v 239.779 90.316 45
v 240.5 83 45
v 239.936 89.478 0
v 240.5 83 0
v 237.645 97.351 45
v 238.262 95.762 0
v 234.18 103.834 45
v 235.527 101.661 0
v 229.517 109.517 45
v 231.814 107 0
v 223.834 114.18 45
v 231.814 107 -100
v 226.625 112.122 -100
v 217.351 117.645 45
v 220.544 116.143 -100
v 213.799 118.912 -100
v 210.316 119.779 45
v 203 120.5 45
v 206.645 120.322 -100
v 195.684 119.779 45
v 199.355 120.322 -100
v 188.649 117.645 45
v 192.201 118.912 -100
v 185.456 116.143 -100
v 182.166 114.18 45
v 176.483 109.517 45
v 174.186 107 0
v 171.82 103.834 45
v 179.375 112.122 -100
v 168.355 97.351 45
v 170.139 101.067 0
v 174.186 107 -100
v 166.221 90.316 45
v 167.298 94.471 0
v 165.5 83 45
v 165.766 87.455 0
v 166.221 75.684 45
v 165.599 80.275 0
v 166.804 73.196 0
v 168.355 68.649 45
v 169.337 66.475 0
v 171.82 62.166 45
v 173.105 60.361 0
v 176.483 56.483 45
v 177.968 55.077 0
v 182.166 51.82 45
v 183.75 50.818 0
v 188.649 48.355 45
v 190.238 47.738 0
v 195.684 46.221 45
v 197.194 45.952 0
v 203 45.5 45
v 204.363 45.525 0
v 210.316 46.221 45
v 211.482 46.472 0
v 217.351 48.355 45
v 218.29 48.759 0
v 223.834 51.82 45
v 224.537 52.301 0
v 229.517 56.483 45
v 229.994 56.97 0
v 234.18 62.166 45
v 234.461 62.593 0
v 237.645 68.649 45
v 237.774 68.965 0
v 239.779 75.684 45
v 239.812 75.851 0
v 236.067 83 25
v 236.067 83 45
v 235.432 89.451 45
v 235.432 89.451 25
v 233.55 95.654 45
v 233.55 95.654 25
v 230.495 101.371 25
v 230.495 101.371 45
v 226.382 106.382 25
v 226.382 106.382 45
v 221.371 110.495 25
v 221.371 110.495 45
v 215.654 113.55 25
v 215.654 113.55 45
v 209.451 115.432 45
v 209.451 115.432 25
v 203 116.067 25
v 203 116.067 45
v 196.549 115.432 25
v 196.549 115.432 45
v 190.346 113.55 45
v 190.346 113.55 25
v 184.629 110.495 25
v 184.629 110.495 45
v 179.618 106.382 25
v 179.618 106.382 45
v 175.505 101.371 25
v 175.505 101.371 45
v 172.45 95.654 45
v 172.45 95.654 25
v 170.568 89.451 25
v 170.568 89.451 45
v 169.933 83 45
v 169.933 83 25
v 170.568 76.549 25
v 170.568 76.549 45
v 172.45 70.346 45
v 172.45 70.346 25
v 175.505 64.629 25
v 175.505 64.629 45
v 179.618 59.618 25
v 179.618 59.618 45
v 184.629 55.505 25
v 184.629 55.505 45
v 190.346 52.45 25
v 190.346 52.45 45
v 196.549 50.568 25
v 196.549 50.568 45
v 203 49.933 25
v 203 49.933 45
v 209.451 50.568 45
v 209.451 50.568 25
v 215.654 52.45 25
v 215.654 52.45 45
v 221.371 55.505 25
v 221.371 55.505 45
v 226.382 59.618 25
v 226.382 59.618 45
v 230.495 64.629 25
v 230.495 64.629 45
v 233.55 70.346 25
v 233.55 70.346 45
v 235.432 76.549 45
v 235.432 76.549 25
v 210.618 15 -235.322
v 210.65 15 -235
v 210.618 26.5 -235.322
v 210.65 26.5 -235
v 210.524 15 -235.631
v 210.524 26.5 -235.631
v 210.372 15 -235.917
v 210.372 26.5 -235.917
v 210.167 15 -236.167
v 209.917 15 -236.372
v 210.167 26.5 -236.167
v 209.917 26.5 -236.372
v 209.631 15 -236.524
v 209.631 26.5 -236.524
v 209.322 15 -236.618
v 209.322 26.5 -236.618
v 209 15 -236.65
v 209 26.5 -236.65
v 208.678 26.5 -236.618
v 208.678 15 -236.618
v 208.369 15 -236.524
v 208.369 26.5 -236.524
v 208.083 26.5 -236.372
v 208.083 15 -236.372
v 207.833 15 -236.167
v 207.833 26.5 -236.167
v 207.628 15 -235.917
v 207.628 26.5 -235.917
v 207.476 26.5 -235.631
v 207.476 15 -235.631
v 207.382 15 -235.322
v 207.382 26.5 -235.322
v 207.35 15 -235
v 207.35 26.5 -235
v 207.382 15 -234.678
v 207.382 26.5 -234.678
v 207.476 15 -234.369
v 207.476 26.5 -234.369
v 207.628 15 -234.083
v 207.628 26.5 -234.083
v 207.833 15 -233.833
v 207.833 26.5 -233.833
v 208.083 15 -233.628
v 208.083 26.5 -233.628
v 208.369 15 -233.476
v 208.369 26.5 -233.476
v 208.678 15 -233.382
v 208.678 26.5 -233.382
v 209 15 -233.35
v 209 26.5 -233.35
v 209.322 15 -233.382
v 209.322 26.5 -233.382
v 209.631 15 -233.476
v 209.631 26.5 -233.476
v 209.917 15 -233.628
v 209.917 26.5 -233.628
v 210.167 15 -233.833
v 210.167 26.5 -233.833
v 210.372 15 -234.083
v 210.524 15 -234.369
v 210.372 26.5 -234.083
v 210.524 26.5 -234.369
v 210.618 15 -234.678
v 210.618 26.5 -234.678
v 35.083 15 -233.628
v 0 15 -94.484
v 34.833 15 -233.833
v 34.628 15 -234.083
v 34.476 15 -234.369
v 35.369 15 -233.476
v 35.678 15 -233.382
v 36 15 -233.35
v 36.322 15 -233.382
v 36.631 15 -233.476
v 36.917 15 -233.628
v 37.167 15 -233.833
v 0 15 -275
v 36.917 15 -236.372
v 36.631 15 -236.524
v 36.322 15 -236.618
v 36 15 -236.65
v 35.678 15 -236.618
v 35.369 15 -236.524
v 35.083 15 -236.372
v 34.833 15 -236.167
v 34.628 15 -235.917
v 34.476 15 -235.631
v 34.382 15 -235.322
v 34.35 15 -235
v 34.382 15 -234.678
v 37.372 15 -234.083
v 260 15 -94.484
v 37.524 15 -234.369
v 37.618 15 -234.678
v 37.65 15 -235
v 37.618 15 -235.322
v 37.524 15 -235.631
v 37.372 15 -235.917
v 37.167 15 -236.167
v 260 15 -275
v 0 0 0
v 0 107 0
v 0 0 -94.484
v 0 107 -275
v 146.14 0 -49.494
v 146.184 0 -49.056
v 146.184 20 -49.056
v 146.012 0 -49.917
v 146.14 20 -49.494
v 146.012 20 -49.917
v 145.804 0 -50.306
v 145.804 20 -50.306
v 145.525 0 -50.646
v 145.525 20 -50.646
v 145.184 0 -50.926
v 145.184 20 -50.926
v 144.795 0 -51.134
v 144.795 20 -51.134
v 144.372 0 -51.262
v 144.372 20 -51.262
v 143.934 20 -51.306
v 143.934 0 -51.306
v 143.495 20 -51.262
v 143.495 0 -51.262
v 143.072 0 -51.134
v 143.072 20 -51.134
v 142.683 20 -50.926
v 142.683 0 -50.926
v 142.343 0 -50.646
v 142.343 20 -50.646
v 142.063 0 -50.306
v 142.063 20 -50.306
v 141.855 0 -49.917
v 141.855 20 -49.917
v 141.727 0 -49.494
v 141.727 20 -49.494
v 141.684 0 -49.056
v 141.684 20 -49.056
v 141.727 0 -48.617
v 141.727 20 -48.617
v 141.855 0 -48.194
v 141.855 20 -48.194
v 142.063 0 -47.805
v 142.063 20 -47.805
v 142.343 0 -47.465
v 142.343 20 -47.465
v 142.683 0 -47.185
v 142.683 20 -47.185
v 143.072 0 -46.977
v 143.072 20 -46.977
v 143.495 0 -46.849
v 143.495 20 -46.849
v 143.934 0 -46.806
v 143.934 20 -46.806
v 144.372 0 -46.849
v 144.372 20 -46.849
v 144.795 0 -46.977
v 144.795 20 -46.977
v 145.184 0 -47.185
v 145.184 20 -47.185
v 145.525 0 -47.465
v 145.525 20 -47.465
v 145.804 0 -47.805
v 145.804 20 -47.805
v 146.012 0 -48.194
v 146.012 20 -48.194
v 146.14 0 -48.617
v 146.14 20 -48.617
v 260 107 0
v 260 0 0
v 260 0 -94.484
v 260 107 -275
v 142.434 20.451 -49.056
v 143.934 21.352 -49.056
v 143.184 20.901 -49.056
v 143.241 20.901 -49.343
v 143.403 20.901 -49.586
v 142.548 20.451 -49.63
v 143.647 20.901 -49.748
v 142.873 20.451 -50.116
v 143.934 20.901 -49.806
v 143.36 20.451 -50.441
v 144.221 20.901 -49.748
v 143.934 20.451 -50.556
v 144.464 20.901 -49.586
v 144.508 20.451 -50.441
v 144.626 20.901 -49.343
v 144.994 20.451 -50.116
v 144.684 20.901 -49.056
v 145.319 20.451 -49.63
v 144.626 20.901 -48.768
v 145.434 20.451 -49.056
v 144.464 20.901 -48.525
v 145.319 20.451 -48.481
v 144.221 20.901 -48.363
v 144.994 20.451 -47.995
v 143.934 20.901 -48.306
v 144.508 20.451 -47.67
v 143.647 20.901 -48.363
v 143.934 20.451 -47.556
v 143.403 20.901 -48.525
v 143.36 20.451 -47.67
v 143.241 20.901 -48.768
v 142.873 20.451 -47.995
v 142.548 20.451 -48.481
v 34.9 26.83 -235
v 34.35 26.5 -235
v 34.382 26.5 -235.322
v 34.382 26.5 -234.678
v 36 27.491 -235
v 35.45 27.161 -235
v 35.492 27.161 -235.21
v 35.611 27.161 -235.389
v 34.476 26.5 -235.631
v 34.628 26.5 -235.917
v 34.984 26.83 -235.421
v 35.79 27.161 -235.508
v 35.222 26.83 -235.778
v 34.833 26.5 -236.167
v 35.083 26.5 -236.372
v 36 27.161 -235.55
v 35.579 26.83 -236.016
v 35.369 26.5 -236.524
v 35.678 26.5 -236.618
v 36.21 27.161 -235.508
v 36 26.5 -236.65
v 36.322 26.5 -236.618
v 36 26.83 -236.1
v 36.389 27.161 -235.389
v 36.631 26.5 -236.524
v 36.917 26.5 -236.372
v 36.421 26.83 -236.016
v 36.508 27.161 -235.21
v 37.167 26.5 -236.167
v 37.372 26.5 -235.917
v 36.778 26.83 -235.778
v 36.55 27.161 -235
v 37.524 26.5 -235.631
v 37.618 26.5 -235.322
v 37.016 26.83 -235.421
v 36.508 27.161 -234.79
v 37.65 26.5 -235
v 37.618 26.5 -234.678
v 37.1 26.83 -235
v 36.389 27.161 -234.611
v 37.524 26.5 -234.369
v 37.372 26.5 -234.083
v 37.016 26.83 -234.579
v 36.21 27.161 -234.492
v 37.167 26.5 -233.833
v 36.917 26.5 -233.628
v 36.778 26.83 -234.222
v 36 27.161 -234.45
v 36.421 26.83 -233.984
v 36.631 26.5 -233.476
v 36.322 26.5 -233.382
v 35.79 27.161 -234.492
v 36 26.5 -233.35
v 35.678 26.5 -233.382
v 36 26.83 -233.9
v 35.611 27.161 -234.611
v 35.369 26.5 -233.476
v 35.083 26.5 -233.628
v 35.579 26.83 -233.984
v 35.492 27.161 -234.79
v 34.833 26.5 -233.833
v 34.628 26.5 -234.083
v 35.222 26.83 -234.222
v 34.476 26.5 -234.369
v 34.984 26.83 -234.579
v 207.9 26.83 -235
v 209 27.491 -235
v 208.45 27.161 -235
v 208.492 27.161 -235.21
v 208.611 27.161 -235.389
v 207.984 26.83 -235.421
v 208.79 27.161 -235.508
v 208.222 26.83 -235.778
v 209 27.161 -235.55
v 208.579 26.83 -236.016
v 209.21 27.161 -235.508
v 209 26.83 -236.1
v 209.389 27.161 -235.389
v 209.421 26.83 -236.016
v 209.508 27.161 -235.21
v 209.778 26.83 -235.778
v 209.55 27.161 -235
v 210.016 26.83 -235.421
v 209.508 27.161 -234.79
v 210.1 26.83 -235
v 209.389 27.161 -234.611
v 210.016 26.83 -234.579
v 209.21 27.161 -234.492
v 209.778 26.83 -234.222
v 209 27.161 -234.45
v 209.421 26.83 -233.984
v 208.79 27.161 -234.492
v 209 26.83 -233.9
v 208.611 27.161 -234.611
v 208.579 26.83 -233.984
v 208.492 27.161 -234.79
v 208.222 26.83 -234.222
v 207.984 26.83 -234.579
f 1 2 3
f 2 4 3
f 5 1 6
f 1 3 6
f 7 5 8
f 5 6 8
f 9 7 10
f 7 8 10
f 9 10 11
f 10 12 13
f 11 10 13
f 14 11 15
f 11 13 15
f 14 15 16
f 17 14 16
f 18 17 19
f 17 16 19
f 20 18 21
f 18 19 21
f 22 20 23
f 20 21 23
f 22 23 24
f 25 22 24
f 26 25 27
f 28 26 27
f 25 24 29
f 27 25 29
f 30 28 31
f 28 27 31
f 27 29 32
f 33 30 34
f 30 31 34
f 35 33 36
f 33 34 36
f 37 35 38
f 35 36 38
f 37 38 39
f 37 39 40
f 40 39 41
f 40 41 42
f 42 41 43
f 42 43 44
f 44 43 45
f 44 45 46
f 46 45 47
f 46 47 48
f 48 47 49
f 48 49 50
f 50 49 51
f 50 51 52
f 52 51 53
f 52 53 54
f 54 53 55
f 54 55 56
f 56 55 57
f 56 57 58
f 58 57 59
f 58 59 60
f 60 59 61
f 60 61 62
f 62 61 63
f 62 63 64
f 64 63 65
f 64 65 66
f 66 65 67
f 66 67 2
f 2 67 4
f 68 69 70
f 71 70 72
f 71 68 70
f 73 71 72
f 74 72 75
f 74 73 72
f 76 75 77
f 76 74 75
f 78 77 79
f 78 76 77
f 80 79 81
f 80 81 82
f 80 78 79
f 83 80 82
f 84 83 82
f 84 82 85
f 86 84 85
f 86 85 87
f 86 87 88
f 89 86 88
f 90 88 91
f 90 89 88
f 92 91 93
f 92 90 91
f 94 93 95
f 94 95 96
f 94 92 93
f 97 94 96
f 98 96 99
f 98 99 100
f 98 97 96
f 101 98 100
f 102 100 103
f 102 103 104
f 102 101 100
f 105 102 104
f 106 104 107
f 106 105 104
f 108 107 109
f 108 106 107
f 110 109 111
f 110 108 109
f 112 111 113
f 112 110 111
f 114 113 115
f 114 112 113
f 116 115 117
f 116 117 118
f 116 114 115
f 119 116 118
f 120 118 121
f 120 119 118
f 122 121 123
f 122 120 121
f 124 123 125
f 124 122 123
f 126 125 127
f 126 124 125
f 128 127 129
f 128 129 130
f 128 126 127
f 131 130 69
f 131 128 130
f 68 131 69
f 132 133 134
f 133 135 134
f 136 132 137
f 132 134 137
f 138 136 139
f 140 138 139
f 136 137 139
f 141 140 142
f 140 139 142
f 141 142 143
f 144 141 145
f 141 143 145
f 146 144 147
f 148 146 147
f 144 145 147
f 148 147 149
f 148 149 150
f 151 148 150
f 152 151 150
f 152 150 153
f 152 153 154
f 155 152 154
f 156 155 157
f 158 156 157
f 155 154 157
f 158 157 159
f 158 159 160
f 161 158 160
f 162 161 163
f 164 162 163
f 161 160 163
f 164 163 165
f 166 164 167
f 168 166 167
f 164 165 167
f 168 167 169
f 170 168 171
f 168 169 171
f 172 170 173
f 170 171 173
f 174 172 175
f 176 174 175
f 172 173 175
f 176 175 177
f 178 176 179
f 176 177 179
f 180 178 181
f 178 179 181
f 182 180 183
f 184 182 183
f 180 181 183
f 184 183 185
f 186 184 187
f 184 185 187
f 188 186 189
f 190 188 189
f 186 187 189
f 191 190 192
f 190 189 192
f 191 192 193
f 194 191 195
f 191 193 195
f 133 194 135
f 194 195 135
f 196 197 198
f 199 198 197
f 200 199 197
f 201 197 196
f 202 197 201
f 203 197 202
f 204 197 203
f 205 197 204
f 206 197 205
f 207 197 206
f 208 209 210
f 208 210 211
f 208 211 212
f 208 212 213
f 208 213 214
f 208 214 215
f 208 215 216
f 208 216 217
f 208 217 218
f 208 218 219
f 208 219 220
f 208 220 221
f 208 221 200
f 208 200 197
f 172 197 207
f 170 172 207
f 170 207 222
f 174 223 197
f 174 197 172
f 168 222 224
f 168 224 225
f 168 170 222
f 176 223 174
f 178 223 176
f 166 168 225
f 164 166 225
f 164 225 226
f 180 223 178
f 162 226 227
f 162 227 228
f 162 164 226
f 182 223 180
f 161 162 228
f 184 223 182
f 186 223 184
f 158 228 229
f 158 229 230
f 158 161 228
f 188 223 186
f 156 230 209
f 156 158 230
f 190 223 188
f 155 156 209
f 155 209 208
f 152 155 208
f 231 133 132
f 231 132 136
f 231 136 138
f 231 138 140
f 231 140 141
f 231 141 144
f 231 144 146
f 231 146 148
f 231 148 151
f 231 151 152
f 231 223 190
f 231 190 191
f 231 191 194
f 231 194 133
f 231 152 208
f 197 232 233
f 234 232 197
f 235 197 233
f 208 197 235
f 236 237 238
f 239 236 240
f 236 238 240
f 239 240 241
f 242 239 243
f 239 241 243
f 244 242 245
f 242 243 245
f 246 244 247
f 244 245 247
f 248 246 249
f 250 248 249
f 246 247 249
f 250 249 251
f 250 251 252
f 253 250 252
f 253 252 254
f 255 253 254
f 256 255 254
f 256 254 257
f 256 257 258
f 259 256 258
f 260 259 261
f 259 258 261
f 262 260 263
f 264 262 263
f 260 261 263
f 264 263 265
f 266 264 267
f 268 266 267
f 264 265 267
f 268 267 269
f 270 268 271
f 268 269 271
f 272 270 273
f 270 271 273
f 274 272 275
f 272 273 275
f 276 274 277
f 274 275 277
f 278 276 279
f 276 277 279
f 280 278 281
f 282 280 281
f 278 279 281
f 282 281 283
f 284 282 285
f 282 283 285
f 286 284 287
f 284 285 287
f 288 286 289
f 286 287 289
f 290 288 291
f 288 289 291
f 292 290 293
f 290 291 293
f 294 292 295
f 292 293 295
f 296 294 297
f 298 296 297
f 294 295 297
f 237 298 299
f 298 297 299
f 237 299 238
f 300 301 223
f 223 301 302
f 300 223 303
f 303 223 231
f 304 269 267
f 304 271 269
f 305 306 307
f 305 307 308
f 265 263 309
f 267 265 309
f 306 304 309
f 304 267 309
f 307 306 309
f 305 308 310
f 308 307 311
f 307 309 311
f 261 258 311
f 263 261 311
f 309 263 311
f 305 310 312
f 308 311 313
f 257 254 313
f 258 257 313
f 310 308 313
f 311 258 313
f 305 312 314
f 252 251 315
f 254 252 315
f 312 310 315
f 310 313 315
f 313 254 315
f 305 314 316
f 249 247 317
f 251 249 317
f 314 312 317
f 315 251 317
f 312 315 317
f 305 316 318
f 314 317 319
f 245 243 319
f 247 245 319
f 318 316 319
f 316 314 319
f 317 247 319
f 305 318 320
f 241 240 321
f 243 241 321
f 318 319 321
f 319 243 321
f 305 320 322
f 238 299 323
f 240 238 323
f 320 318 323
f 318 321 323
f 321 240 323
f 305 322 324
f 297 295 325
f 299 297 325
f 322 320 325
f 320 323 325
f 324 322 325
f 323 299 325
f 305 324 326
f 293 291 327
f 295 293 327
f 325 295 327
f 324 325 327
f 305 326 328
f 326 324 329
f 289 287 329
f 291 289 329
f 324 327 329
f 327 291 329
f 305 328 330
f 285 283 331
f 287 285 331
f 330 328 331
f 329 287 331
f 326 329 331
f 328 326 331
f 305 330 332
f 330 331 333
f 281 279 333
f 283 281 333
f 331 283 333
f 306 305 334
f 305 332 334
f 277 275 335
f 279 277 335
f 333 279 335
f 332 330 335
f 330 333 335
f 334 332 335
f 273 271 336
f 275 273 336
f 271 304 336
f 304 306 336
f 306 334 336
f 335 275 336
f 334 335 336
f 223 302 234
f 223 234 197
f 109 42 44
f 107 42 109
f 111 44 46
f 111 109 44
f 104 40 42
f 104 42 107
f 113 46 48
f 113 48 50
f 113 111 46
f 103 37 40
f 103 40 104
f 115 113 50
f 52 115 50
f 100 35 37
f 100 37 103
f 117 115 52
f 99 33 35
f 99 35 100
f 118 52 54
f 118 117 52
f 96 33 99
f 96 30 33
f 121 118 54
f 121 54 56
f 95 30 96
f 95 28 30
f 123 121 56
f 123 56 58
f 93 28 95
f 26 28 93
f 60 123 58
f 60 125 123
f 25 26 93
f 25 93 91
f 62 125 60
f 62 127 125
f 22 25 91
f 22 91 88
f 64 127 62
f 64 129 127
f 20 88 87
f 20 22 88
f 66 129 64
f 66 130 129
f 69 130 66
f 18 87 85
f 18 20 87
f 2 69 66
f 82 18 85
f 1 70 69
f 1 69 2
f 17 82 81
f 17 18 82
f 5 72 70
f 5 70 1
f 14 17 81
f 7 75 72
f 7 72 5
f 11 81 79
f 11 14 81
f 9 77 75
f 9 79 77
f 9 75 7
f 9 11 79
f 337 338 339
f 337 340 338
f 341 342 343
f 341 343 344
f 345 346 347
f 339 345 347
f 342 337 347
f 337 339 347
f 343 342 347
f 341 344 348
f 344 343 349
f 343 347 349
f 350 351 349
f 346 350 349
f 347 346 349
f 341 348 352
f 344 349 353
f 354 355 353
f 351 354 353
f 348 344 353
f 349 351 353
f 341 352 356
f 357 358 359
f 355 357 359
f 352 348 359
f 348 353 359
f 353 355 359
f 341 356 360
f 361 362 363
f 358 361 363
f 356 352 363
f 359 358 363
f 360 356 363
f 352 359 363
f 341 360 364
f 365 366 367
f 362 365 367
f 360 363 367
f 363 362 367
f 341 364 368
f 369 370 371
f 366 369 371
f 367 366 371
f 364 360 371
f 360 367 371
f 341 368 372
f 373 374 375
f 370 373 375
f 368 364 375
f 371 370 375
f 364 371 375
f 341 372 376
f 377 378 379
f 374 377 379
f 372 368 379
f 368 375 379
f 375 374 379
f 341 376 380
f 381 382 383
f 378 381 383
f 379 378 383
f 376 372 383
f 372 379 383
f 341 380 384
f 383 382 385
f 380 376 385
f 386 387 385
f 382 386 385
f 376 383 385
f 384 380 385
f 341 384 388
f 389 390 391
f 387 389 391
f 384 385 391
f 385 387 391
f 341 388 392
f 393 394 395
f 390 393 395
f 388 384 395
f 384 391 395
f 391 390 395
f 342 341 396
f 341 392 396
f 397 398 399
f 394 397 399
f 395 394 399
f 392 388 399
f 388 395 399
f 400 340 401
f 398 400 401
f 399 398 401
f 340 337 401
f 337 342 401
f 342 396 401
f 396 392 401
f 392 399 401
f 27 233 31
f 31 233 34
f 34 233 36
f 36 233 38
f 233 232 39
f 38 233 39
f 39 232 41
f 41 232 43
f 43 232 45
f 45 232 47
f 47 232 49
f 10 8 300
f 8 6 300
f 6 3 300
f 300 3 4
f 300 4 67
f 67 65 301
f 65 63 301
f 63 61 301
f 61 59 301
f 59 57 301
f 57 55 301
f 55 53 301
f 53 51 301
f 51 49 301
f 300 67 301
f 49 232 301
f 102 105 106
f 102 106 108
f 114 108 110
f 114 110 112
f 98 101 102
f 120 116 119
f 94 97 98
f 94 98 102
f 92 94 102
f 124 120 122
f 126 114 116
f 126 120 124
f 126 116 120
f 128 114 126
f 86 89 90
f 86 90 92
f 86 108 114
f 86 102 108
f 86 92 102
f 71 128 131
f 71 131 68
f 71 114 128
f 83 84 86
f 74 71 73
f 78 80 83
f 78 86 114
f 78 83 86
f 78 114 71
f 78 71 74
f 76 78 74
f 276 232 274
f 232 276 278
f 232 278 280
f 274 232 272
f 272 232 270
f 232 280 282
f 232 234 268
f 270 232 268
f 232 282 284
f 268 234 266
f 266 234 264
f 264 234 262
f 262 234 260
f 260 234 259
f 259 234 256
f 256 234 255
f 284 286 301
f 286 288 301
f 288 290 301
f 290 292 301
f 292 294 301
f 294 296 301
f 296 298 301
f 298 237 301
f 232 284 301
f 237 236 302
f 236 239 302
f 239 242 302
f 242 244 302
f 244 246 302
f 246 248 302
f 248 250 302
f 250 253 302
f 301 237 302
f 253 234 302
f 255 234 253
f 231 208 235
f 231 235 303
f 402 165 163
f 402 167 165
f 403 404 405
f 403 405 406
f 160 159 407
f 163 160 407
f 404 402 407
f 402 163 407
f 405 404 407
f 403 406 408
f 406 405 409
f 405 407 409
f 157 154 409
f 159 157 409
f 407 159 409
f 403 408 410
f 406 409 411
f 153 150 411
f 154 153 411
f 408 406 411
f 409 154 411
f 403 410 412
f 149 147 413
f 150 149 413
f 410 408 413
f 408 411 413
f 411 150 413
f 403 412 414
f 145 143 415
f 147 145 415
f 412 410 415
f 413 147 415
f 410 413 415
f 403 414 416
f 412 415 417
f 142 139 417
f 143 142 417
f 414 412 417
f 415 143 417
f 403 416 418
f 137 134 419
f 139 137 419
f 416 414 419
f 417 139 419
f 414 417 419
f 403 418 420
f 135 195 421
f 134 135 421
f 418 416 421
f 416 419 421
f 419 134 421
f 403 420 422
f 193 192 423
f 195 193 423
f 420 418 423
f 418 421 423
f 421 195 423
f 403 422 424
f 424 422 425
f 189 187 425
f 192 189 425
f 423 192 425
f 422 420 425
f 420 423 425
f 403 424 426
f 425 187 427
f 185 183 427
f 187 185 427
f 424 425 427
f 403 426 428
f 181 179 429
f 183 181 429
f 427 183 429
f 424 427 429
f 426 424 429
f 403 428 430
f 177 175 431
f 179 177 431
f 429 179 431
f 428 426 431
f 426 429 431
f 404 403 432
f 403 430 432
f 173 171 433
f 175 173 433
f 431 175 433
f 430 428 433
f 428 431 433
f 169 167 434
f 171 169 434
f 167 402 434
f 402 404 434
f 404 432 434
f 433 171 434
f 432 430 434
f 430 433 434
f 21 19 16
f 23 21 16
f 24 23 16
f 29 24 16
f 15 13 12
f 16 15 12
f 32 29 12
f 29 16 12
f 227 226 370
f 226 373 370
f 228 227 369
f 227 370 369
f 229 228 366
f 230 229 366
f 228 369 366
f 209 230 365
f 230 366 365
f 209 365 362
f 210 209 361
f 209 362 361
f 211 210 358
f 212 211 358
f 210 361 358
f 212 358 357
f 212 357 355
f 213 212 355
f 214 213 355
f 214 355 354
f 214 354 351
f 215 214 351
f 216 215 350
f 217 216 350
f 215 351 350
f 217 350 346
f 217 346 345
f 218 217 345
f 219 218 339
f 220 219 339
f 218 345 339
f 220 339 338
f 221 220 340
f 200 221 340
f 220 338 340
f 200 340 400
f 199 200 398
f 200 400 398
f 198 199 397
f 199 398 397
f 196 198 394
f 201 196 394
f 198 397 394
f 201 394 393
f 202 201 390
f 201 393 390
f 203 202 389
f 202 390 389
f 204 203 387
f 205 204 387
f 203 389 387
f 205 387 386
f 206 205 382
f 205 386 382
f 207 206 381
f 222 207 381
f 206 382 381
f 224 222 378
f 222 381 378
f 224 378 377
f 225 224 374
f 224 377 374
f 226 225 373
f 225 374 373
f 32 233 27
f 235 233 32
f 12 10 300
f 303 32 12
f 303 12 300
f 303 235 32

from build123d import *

# Parameters (mm, degrees)
SKETCH_1_W             = 260
SKETCH_1_H             = 275
EXTRUDE_1_DEPTH        = 107
EXTRUDE_2_DEPTH        = 25
EXTRUDE_2_DEPTH_BACK   = 100
SKETCH_2_R             = 37.5
SKETCH_3_W             = 180.515861549
SKETCH_3_H             = 15
CUT_EXTRUDE_1_DEPTH    = 398.171562426
M4X0_7_1_D             = 3.3
M4X0_7_1_DEPTH         = 11.5
M4X0_7_1_TIP           = 0.991420021
SKETCH_17_R            = 37.5
SKETCH_17_R_2          = 33.067386868
EXTRUDE_4_DEPTH        = 20
HOLE_WIZARD_M4_1_D     = 4.5
HOLE_WIZARD_M4_1_DEPTH = 20
HOLE_WIZARD_M4_1_TIP   = 1.351936393


with BuildPart() as part:
    # Sketch 1 → 보스-돌출1 (new body)
    with BuildSketch(Plane(origin=(0, 0, 0), x_dir=(1, 0, 0), z_dir=(0, 1, 0))):
        with Locations((130, 137.5)):
            Rectangle(SKETCH_1_W, SKETCH_1_H)
    extrude(amount=EXTRUDE_1_DEPTH)

    # Sketch 2 → 보스-돌출2 (add, two sides: drawn at the far end of the back side and taken through both)
    with BuildSketch(Plane.XY.offset(-EXTRUDE_2_DEPTH_BACK)):
        with Locations((203, 83)):
            Circle(SKETCH_2_R)
    extrude(amount=EXTRUDE_2_DEPTH + EXTRUDE_2_DEPTH_BACK)

    # 스케치3 → 컷-돌출1 (cut, through all)
    with BuildSketch(Plane(origin=(260, 0, 0), x_dir=(0, 0, -1), z_dir=(1, 0, 0))):
        with Locations((184.742069226, 7.5)):
            Rectangle(SKETCH_3_W, SKETCH_3_H)
    extrude(amount=-CUT_EXTRUDE_1_DEPTH, mode=Mode.SUBTRACT)

    # M4x0.7 나사 구멍1
    with Locations(Plane(origin=(0, 15, 0), x_dir=(-1, 0, 0), z_dir=(0, -1, 0))):
        with Locations((-36, 235), (-209, 235)):
            Hole(M4X0_7_1_D / 2, depth=M4X0_7_1_DEPTH)
            with Locations((0, 0, -(M4X0_7_1_DEPTH + M4X0_7_1_TIP / 2))):  # 118° drill point
                Cone(0, M4X0_7_1_D / 2, M4X0_7_1_TIP, mode=Mode.SUBTRACT)

    # 스케치17 → 보스-돌출4 (add)
    with BuildSketch(Plane.XY.offset(25)):
        with Locations((203, 83)):
            Circle(SKETCH_17_R)
        with Locations((203, 83)):
            Circle(SKETCH_17_R_2, mode=Mode.SUBTRACT)
    extrude(amount=EXTRUDE_4_DEPTH)

    # M4 여유 구멍1
    with Locations(Plane(origin=(0, 0, 0), x_dir=(-1, 0, 0), z_dir=(0, -1, 0))):
        with Locations((-143.933526012, 49.055508383)):
            Hole(HOLE_WIZARD_M4_1_D / 2, depth=HOLE_WIZARD_M4_1_DEPTH)
            with Locations((0, 0, -(HOLE_WIZARD_M4_1_DEPTH + HOLE_WIZARD_M4_1_TIP / 2))):  # 118° drill point
                Cone(0, HOLE_WIZARD_M4_1_D / 2, HOLE_WIZARD_M4_1_TIP, mode=Mode.SUBTRACT)


solid = part.part
